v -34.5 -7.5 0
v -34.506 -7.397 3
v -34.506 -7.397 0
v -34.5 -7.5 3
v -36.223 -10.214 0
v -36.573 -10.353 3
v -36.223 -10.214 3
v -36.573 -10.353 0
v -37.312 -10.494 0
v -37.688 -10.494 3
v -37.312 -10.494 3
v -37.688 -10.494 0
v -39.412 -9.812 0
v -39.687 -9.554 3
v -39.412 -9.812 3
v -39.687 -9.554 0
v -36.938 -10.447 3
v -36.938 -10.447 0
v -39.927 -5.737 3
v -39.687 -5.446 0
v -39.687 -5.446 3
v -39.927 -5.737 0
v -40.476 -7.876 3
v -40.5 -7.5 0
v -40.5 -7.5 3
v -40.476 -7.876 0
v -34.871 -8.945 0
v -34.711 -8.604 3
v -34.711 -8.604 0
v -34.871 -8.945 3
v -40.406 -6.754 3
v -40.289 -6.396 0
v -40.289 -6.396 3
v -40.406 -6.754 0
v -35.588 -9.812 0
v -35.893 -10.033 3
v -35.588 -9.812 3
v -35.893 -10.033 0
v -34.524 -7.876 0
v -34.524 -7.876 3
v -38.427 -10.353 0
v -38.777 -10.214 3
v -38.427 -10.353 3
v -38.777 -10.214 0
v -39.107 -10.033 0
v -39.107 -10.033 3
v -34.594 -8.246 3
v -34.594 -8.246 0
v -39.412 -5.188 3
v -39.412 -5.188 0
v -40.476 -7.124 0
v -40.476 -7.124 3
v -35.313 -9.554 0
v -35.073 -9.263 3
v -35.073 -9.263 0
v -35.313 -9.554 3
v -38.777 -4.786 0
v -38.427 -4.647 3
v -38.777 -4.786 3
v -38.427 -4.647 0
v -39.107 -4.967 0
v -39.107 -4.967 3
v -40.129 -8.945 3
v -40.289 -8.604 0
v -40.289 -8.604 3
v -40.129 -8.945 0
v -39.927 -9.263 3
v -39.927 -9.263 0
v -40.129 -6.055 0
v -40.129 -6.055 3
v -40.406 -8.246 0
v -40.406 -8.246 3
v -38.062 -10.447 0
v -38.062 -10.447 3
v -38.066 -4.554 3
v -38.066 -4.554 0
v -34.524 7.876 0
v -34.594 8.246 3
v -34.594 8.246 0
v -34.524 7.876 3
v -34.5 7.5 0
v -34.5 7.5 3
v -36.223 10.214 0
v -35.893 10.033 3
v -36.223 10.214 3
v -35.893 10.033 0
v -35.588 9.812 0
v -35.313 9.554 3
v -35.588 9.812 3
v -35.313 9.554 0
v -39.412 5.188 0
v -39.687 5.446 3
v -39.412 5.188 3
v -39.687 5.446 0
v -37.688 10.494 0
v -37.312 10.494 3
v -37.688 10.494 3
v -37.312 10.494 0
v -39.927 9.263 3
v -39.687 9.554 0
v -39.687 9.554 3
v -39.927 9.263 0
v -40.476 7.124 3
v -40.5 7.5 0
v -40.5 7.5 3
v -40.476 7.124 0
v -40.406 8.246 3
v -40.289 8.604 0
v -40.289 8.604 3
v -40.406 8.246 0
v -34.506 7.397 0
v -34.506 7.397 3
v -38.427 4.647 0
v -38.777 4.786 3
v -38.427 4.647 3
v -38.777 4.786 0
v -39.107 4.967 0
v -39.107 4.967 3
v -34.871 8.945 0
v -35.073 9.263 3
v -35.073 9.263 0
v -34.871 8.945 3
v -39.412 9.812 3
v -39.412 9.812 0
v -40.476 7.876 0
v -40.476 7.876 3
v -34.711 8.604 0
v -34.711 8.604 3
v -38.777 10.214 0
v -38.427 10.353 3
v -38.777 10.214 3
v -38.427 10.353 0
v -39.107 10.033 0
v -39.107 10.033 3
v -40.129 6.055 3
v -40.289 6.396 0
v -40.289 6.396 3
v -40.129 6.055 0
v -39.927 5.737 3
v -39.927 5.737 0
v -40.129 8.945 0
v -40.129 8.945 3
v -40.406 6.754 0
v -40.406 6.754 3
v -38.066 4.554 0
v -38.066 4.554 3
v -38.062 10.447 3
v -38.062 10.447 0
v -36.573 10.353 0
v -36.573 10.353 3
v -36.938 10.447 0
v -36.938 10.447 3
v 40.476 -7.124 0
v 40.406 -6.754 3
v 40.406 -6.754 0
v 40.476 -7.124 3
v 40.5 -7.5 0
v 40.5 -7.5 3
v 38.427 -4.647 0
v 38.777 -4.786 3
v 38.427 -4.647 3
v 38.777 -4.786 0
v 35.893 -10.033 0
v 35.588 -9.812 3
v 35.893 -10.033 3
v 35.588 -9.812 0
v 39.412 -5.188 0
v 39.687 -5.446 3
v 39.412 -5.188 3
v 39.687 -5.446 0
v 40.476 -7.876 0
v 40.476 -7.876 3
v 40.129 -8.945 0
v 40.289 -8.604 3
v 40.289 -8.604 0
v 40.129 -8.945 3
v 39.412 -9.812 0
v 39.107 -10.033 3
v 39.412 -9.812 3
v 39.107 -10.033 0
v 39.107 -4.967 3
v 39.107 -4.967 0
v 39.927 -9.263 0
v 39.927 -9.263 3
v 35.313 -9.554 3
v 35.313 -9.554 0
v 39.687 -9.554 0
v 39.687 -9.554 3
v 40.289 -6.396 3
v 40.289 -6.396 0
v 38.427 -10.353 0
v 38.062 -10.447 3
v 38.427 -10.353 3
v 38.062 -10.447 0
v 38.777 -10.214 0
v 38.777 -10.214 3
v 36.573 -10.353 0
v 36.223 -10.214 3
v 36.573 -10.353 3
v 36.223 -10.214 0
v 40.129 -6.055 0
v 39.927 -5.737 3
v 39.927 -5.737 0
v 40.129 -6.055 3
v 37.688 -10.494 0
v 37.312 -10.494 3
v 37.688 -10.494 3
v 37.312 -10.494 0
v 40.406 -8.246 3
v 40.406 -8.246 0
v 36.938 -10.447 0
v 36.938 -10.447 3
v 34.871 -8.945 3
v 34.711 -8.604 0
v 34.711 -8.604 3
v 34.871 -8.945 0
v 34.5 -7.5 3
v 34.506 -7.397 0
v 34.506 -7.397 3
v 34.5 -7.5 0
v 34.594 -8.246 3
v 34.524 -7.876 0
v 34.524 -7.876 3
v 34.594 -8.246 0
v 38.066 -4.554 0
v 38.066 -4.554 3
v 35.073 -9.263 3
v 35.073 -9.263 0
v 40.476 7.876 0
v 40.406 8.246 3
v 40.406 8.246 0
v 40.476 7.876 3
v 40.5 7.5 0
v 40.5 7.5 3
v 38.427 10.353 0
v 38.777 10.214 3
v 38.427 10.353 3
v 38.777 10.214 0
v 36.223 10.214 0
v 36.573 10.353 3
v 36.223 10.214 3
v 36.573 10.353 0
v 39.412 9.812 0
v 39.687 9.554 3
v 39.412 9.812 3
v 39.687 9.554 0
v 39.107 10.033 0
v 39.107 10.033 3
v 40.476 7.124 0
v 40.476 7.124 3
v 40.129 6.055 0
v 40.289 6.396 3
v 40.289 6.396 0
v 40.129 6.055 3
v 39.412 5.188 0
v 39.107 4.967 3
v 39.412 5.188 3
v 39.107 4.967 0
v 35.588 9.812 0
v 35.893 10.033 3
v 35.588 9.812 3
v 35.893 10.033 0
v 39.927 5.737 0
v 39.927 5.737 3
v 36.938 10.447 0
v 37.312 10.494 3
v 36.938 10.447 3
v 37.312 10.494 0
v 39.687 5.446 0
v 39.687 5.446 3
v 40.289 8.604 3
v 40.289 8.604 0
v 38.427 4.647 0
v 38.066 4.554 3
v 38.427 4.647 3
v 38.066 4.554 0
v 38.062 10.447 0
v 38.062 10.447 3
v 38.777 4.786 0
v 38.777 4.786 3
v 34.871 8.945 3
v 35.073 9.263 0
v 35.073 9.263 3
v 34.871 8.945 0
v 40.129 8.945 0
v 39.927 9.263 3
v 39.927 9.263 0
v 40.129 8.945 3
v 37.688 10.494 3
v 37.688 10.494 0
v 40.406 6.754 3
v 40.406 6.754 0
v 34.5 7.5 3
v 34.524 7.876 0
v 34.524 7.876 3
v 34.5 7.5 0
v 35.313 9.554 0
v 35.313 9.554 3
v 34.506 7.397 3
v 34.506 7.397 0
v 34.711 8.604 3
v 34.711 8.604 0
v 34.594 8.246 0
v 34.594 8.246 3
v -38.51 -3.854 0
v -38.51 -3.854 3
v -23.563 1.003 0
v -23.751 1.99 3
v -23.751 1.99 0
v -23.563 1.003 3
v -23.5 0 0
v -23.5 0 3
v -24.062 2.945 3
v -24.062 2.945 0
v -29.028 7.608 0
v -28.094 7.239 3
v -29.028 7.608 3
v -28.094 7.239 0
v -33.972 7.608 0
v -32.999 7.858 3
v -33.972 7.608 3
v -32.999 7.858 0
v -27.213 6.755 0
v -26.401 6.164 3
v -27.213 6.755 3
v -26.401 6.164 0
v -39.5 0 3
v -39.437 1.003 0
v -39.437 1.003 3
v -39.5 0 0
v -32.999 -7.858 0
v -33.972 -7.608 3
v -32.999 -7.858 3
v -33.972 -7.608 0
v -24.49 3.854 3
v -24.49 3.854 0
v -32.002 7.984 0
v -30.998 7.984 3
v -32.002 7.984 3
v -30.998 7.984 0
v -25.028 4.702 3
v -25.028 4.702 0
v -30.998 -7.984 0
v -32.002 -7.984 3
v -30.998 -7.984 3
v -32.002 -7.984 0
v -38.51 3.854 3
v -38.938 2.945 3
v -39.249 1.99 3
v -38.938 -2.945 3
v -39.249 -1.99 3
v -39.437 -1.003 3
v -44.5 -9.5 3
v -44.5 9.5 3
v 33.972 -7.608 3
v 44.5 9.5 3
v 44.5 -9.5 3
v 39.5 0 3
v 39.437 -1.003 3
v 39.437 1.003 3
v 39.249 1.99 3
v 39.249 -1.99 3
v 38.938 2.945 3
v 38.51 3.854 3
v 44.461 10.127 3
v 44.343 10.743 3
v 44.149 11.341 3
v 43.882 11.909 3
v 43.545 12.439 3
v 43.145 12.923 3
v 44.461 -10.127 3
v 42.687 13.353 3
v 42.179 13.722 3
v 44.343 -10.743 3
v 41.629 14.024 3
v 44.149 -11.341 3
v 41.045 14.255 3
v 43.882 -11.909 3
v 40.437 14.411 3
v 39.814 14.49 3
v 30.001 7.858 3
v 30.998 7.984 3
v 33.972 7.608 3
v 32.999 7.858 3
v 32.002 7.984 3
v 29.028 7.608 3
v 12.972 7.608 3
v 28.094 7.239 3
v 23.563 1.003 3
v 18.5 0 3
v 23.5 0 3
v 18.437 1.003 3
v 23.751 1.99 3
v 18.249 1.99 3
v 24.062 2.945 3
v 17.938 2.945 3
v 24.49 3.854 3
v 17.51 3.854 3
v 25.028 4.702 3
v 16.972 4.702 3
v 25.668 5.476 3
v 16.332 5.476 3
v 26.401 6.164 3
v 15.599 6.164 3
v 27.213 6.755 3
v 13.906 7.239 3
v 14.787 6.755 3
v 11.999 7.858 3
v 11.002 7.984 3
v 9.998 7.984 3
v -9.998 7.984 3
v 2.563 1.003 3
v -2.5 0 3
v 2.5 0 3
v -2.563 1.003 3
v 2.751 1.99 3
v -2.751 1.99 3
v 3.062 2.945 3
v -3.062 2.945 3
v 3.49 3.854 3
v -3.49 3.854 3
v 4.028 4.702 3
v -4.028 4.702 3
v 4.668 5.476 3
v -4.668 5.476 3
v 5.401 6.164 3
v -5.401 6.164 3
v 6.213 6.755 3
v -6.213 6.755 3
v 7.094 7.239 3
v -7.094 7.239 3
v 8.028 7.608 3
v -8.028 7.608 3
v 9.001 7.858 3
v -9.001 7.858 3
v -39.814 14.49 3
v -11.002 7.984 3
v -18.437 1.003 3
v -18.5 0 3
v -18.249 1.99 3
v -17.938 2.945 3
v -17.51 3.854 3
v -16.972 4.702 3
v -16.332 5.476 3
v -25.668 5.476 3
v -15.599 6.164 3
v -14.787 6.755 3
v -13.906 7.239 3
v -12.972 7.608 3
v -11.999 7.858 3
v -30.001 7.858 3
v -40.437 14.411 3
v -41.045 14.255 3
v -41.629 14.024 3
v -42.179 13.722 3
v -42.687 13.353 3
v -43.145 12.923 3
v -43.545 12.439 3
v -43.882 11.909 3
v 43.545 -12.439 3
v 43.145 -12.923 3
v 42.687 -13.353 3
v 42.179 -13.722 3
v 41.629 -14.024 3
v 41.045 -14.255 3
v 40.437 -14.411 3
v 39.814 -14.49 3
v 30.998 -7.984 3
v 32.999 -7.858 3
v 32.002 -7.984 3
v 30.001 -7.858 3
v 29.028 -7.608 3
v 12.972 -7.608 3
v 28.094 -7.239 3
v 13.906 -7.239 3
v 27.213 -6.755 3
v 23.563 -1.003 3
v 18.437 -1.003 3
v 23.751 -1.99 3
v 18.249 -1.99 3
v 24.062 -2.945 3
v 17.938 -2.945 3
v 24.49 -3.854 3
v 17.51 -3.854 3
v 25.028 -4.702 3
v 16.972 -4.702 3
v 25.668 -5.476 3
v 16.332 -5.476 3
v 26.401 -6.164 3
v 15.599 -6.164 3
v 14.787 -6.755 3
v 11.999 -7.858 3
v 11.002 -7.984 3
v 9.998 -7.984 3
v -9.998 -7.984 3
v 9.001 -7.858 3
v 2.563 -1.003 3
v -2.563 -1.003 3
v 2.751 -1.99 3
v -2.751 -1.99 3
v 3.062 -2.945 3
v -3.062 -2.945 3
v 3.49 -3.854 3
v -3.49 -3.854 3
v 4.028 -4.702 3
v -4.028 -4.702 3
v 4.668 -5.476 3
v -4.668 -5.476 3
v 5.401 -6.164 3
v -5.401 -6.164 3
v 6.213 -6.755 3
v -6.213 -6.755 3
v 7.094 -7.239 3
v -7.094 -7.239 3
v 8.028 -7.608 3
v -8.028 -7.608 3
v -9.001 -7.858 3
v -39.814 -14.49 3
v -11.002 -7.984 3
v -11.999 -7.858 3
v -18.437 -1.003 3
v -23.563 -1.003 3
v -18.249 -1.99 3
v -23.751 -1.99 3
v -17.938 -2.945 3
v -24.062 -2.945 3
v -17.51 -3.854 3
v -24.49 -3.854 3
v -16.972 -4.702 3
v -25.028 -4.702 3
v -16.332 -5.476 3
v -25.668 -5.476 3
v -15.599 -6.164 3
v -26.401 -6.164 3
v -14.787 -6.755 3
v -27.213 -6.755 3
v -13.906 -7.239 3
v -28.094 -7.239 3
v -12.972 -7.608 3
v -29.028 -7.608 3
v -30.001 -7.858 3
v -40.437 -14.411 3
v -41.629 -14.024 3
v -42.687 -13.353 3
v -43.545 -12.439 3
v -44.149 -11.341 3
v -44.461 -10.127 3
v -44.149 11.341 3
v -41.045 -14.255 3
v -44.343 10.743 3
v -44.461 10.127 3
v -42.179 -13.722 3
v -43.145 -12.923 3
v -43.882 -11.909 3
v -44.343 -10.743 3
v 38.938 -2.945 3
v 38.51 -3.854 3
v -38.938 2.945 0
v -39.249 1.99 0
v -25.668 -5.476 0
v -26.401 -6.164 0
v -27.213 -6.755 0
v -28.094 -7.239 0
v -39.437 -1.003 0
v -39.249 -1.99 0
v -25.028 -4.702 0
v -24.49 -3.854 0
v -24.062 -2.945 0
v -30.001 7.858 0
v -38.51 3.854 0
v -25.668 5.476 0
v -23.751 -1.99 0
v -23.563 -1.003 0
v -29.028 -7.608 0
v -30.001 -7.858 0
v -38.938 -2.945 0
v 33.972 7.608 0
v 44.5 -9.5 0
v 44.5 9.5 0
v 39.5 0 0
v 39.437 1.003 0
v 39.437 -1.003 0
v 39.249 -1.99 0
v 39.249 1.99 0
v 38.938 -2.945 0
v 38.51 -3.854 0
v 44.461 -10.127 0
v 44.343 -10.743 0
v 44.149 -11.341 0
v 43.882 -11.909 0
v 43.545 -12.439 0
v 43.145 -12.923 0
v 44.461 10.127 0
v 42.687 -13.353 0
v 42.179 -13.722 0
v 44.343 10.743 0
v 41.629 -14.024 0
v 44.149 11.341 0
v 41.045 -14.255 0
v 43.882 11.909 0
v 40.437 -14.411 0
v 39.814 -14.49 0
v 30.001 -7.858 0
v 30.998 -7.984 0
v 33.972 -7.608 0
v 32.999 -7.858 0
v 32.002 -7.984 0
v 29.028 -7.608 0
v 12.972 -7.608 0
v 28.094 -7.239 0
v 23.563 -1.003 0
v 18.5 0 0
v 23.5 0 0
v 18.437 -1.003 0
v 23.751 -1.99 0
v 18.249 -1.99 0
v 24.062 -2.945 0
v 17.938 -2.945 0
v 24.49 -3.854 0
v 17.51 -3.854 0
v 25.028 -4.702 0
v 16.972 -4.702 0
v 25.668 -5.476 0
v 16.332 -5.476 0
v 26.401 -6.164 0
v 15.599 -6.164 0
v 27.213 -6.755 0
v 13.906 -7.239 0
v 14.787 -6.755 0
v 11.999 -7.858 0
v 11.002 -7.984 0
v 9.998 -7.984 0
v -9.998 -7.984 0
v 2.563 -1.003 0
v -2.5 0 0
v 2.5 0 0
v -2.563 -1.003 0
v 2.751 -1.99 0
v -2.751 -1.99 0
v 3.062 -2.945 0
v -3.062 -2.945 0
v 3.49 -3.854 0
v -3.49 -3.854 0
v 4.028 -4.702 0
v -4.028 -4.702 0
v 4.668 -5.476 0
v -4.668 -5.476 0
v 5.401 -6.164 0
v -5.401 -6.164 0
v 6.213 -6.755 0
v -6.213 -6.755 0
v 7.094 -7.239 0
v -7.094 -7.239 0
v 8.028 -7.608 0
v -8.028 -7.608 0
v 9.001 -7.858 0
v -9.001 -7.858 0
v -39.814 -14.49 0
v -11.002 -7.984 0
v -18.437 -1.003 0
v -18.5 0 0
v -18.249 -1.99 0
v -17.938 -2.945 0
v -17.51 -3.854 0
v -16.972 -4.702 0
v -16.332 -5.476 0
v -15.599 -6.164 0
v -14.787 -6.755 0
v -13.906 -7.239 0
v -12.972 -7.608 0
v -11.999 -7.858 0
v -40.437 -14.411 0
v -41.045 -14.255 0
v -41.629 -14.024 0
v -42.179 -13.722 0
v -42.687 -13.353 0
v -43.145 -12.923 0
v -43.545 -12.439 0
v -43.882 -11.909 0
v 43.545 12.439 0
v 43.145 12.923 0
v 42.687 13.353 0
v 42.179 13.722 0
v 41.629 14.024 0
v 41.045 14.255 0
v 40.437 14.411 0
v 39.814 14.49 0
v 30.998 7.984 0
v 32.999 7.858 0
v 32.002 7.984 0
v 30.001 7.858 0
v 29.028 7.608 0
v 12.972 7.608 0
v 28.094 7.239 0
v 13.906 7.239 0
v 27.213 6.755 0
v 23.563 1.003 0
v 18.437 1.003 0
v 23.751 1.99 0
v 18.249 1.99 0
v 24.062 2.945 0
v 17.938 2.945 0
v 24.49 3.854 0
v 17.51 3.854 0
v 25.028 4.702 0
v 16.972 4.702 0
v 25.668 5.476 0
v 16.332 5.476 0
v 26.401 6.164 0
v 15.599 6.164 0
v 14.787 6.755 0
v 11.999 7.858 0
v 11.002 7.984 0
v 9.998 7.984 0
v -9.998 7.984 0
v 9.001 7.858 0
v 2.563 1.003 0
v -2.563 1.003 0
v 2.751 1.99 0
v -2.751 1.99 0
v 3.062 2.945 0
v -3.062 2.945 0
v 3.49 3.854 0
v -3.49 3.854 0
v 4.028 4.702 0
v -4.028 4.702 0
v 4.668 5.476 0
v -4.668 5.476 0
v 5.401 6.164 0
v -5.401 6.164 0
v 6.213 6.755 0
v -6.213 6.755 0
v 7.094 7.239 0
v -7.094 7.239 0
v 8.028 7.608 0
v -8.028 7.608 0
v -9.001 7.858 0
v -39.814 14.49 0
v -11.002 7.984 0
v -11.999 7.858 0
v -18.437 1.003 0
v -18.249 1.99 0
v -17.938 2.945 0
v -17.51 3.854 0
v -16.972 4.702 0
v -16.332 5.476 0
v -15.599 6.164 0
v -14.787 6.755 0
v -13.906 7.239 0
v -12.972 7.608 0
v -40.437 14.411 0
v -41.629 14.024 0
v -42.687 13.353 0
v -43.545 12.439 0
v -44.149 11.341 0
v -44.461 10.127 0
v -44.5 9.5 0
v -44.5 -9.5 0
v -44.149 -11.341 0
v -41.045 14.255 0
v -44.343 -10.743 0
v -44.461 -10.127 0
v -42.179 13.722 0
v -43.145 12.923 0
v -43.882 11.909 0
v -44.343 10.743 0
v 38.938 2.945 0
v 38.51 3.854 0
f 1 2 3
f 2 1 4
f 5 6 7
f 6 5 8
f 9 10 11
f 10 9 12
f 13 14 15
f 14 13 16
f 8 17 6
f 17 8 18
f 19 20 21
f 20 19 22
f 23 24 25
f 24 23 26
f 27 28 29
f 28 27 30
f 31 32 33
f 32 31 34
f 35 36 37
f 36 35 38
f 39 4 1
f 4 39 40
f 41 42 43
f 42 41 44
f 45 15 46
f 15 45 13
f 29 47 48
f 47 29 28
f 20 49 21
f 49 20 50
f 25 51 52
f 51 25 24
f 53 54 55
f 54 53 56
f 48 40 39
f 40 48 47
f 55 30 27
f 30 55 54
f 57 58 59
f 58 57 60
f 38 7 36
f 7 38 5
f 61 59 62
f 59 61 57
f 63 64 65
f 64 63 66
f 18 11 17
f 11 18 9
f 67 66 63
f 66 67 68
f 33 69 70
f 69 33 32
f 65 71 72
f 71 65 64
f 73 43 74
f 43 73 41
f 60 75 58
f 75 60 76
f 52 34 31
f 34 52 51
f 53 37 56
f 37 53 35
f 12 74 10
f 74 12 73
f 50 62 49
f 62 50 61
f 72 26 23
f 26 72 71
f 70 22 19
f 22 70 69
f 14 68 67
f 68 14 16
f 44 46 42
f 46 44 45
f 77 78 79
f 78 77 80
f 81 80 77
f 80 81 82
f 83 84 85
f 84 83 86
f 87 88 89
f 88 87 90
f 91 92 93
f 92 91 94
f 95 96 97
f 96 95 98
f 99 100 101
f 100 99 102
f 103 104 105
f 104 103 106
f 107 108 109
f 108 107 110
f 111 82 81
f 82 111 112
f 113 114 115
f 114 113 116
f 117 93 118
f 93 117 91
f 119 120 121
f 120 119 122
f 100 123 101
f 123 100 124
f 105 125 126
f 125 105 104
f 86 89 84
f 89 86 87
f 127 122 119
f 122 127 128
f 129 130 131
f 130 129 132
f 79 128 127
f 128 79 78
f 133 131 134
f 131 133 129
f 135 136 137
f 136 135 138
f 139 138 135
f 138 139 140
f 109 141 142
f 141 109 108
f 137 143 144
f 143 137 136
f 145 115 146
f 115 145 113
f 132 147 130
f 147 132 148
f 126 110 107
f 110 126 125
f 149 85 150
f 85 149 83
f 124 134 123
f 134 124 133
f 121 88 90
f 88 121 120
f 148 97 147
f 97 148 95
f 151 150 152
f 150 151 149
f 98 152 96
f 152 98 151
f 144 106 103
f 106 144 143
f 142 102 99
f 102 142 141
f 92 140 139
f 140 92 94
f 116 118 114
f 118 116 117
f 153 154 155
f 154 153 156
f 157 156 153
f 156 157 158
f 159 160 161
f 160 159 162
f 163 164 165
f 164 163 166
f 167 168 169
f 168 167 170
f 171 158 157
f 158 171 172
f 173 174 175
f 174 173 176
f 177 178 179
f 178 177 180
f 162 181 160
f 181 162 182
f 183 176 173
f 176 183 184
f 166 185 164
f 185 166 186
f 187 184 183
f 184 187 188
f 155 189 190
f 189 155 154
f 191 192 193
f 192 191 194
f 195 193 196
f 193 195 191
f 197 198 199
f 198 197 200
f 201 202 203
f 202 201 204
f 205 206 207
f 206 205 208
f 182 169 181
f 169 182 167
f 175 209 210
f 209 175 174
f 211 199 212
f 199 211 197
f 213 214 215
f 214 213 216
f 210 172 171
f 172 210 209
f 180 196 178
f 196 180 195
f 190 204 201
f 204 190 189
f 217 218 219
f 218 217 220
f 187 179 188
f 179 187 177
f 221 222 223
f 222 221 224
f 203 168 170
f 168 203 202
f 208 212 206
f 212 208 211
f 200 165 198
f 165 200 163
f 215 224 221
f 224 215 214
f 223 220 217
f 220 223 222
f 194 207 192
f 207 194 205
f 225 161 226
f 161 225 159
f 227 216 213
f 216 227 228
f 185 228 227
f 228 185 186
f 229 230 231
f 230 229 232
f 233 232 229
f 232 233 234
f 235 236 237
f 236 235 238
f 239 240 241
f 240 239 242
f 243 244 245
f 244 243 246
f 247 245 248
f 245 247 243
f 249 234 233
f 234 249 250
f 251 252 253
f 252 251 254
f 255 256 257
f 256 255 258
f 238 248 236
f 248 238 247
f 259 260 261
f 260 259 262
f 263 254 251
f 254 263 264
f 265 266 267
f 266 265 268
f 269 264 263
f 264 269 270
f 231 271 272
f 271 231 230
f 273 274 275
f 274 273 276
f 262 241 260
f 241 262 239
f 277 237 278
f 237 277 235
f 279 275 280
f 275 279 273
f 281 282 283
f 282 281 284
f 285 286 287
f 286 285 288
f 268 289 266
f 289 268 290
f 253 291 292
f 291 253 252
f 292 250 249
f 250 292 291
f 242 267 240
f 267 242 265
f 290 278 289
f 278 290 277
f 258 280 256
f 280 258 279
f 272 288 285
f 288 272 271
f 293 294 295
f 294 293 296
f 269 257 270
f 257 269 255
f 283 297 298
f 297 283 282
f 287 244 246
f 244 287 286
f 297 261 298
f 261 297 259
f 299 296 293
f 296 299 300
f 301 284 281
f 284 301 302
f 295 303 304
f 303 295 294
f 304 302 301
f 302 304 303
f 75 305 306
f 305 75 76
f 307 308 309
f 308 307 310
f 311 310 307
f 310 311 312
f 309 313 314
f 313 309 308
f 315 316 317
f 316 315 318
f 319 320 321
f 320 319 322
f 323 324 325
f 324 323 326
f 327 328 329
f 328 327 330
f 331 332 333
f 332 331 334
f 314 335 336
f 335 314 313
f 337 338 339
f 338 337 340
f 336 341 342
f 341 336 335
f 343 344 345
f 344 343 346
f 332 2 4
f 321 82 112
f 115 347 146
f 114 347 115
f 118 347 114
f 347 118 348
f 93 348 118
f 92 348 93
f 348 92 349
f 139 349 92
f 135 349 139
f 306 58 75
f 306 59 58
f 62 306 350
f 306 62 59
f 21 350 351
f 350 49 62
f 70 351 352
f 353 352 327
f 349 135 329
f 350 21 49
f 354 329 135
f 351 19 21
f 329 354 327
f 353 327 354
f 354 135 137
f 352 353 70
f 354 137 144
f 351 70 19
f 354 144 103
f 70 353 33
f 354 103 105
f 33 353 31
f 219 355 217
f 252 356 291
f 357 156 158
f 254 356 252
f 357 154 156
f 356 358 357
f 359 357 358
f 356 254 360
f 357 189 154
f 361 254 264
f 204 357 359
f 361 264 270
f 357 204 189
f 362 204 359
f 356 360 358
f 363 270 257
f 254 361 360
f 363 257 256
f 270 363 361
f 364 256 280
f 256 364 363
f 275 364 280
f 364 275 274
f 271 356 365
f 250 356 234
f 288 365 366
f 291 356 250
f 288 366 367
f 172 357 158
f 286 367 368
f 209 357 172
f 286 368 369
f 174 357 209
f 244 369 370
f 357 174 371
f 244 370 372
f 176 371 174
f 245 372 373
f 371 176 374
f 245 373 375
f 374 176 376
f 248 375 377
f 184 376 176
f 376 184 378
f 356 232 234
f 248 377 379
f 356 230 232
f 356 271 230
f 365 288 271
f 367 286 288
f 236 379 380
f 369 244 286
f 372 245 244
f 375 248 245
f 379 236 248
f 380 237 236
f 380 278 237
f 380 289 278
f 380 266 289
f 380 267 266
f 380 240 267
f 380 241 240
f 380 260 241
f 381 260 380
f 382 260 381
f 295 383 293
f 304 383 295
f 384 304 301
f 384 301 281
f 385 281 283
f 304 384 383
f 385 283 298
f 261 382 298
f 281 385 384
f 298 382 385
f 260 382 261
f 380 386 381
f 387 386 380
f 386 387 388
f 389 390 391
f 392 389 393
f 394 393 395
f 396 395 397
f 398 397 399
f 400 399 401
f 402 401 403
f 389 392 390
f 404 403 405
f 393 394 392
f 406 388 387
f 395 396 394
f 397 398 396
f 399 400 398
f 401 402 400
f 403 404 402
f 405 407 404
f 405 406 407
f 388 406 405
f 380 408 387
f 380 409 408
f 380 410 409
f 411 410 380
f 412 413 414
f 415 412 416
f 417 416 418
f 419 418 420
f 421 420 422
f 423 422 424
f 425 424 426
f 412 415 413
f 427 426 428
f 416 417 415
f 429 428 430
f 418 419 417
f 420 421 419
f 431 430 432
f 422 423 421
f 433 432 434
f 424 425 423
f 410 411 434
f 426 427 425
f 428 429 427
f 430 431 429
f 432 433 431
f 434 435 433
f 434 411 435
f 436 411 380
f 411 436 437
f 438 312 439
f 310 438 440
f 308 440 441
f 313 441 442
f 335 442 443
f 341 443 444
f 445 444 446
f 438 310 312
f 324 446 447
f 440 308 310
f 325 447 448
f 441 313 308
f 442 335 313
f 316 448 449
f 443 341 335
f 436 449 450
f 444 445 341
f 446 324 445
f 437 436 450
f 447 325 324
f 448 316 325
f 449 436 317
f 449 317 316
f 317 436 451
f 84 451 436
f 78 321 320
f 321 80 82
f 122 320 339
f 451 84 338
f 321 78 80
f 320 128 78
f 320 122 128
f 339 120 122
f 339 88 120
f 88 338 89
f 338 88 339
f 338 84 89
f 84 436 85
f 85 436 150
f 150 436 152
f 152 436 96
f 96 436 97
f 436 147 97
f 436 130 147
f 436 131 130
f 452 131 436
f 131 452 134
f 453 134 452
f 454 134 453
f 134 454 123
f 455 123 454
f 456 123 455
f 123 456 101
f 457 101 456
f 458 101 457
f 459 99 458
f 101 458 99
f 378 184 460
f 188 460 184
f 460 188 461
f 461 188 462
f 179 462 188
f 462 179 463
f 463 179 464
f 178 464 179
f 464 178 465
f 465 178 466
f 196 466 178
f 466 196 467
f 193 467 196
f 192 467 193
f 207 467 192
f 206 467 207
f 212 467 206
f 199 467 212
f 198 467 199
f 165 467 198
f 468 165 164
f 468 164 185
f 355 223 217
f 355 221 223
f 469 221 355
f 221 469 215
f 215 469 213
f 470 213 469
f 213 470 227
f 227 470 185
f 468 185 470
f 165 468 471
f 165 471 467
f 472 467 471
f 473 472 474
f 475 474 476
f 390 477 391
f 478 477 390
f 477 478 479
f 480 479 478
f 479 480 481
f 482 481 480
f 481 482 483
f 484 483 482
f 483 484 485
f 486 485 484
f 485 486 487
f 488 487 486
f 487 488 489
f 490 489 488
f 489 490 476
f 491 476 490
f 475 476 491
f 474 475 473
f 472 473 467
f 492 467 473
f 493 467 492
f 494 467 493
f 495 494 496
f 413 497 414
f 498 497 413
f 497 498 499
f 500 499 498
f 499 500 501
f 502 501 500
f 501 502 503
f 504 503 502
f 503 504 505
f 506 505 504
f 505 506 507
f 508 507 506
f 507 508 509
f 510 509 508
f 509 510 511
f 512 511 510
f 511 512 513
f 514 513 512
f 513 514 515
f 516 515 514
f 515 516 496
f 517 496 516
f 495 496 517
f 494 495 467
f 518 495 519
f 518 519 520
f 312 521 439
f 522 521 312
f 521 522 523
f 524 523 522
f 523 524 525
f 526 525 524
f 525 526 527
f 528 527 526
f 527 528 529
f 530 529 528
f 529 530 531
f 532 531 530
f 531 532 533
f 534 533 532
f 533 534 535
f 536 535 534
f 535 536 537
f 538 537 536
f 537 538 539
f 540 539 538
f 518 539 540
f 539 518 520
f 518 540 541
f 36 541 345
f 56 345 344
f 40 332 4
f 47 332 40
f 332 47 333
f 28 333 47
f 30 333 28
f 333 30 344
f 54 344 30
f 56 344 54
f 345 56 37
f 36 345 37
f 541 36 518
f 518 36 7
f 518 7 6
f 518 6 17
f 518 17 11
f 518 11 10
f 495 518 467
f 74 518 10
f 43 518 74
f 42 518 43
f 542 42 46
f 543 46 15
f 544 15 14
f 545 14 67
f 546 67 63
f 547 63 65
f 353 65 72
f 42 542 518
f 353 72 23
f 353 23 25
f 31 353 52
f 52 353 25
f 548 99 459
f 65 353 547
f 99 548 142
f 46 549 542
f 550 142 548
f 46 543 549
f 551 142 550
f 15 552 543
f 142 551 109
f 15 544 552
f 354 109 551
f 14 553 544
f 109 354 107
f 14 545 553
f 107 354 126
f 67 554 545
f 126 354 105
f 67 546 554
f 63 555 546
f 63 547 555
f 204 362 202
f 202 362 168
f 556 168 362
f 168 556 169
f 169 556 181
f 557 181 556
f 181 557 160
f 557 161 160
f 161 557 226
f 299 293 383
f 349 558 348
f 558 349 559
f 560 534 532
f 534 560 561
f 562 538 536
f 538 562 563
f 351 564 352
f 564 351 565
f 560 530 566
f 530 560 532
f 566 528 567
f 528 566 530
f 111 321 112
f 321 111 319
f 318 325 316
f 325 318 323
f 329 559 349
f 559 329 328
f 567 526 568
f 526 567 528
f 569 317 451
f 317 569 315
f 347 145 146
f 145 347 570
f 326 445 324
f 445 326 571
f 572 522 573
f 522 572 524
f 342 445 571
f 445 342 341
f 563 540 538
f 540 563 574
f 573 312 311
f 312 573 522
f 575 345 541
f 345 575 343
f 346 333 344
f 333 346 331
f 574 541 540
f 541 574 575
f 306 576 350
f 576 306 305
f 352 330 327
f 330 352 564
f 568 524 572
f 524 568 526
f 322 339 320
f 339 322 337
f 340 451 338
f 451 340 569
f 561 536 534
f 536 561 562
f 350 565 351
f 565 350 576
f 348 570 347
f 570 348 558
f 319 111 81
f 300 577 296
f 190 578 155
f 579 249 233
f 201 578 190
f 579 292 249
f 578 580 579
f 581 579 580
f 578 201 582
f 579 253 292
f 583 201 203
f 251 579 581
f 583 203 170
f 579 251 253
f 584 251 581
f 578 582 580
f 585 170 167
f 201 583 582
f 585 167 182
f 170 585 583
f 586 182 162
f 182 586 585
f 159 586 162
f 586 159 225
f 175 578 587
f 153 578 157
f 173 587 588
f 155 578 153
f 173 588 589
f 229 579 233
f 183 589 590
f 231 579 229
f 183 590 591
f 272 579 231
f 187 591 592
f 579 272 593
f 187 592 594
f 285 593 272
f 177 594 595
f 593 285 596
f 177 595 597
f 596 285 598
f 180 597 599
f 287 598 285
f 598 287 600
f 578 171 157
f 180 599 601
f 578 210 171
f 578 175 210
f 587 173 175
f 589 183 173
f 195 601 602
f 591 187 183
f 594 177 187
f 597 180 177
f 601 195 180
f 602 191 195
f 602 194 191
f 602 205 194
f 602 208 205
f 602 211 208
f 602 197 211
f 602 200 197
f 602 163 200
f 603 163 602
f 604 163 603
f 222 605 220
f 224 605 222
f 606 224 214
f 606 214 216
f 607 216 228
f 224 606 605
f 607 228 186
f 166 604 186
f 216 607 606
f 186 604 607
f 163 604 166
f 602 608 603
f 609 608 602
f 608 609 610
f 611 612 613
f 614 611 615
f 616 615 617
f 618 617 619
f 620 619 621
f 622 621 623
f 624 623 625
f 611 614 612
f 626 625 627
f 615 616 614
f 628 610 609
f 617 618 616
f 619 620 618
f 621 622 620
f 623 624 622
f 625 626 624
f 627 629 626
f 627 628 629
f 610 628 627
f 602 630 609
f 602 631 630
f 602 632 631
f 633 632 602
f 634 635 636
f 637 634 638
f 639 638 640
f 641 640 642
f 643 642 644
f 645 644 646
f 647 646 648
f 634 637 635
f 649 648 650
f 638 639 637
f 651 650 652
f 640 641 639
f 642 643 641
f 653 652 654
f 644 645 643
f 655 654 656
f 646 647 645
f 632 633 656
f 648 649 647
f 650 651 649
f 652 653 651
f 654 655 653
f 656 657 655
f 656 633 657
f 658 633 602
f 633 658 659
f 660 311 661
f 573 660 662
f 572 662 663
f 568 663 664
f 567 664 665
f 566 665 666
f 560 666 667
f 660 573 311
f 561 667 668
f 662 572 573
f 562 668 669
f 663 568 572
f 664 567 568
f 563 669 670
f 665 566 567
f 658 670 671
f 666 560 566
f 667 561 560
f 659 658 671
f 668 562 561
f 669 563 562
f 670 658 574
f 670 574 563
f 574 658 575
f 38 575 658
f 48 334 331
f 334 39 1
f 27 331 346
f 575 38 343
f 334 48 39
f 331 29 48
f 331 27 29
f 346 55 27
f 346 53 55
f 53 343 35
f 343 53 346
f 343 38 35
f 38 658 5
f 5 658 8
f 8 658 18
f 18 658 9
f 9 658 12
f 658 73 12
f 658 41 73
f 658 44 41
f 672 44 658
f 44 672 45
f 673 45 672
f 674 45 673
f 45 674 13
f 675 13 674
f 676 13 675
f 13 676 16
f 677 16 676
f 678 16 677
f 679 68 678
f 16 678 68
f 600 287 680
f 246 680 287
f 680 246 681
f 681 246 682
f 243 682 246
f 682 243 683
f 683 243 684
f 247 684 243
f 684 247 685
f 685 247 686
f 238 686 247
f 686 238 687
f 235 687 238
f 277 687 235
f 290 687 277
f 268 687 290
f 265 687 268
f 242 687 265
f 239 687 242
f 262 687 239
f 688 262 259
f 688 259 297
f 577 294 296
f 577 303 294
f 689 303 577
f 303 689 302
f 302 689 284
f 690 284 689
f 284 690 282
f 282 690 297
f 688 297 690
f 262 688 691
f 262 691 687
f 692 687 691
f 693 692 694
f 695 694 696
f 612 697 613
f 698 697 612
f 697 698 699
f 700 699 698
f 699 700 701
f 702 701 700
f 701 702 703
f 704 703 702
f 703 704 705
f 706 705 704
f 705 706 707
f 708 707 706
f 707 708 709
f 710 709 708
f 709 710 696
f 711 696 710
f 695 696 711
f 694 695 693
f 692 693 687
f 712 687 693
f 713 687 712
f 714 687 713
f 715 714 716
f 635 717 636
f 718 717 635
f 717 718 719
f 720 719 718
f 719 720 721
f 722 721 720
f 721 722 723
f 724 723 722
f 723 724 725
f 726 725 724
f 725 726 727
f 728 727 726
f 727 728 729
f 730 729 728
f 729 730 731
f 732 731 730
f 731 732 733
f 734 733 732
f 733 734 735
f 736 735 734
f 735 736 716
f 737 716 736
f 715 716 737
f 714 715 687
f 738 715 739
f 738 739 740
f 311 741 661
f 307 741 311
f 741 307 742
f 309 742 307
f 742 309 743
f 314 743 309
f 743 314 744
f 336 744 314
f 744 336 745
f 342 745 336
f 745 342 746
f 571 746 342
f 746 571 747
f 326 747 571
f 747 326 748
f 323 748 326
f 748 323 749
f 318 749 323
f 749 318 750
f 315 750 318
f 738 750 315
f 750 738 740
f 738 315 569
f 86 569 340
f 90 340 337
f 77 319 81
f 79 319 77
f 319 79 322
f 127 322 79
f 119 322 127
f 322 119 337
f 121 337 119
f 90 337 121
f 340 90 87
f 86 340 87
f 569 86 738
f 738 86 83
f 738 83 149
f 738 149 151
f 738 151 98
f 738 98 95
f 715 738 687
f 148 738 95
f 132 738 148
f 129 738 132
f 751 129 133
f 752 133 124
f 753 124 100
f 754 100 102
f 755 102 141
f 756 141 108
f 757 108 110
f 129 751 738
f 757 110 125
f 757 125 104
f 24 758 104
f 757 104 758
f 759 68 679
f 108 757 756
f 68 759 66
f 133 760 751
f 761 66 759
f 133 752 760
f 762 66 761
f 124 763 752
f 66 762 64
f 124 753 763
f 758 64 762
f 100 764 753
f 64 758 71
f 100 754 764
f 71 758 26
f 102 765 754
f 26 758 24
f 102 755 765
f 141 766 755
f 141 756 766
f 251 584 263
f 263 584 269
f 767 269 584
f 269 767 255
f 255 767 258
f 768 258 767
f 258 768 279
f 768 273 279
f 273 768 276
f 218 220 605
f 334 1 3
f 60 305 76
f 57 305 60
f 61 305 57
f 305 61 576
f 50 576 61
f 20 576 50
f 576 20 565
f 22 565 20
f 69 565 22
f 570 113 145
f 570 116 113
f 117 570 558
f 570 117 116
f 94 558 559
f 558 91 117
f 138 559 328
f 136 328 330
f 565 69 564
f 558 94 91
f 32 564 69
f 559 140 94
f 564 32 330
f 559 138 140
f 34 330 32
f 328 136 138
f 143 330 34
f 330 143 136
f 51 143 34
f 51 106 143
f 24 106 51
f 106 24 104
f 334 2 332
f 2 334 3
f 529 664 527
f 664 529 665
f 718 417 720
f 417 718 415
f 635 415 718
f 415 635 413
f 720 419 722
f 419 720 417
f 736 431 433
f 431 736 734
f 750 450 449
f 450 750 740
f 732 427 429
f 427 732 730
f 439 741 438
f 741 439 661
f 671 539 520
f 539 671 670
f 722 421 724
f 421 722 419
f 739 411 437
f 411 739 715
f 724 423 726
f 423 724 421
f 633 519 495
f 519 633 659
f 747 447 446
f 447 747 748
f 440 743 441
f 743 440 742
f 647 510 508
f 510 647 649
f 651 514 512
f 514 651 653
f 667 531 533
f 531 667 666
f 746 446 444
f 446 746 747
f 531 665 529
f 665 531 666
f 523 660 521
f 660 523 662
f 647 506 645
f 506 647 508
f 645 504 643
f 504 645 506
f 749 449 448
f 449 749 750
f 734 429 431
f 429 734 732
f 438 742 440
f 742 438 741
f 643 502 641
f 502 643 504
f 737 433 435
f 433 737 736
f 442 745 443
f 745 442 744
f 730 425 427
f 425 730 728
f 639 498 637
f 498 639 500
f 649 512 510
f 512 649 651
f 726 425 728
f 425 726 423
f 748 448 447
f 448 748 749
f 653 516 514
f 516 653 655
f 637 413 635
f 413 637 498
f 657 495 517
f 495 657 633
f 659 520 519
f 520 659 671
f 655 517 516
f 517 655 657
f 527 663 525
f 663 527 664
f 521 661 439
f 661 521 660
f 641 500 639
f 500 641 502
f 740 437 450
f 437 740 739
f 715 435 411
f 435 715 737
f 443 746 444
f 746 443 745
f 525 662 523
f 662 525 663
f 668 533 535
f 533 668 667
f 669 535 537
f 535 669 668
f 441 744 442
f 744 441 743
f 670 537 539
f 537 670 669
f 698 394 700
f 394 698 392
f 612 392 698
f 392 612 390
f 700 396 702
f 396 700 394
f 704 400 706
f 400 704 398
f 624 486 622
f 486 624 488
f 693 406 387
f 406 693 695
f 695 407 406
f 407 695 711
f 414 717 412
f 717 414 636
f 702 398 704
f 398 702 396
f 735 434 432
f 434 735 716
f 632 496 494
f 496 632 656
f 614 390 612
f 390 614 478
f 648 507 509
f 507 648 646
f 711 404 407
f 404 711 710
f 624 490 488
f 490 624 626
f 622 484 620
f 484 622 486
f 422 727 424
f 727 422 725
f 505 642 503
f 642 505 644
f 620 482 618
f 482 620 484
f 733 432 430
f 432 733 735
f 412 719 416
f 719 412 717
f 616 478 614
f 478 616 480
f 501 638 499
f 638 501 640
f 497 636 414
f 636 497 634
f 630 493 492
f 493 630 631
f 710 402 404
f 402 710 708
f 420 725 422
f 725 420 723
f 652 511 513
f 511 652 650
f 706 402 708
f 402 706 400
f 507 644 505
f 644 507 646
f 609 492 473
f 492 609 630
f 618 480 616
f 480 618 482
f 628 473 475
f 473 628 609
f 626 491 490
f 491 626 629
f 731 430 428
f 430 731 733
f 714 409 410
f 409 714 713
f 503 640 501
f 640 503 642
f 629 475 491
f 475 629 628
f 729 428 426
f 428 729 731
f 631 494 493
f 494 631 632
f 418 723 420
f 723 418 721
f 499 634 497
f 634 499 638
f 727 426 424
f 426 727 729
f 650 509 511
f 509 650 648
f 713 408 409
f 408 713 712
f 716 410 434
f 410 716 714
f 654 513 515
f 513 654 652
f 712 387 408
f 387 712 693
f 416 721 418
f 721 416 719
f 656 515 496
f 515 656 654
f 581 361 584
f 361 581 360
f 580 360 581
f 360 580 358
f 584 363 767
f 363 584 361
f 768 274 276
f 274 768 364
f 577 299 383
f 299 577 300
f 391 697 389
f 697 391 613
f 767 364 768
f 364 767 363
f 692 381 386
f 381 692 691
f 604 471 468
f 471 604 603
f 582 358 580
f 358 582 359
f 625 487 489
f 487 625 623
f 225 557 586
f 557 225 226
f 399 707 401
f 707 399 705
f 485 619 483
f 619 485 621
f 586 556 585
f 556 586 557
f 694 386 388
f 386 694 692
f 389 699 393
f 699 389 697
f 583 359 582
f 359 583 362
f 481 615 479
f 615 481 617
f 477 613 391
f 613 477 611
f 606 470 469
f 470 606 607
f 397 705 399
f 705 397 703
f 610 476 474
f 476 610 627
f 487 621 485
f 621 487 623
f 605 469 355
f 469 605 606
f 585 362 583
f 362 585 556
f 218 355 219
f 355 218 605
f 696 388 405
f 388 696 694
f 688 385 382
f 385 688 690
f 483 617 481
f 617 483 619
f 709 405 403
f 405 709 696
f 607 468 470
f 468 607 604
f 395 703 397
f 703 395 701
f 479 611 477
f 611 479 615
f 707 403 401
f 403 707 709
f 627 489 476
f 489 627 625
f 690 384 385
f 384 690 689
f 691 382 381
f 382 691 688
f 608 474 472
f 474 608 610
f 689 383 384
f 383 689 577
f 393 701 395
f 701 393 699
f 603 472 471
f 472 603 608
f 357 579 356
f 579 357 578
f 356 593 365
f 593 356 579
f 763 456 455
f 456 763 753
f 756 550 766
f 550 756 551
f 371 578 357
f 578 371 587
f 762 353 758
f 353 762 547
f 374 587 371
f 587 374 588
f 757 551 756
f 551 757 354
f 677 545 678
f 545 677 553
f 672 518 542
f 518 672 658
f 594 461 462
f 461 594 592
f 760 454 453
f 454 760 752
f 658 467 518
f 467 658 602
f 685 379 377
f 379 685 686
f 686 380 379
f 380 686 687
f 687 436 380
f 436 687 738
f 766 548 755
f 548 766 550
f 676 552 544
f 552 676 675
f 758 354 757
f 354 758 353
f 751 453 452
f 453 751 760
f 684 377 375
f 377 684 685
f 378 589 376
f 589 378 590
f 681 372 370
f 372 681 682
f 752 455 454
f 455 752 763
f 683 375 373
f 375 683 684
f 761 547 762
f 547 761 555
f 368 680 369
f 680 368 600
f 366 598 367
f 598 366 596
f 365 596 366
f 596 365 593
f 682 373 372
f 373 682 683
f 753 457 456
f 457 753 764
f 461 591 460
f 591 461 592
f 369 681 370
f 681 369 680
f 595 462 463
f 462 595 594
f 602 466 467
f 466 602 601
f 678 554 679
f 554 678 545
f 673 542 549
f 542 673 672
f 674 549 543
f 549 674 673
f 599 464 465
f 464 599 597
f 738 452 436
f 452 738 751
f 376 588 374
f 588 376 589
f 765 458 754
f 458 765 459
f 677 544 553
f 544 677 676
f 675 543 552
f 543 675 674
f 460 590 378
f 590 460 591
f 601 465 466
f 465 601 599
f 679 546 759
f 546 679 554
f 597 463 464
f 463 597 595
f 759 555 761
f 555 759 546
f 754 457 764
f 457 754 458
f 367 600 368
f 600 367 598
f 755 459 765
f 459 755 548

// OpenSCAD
$fn = 50;


difference() {
	union() {
		hull() {
			translate(v = [-39.5000000000, 9.5000000000, 0]) {
				cylinder(h = 3, r = 5);
			}
			translate(v = [39.5000000000, 9.5000000000, 0]) {
				cylinder(h = 3, r = 5);
			}
			translate(v = [-39.5000000000, -9.5000000000, 0]) {
				cylinder(h = 3, r = 5);
			}
			translate(v = [39.5000000000, -9.5000000000, 0]) {
				cylinder(h = 3, r = 5);
			}
		}
	}
	union() {
		#translate(v = [-37.5000000000, -7.5000000000, -100.0000000000]) {
			cylinder(h = 200, r = 3.0000000000);
		}
		#translate(v = [-37.5000000000, 7.5000000000, -100.0000000000]) {
			cylinder(h = 200, r = 3.0000000000);
		}
		#translate(v = [37.5000000000, -7.5000000000, -100.0000000000]) {
			cylinder(h = 200, r = 3.0000000000);
		}
		#translate(v = [37.5000000000, 7.5000000000, -100.0000000000]) {
			cylinder(h = 200, r = 3.0000000000);
		}
		#translate(v = [-31.5000000000, 0, 0]) {
			cylinder(h = 3, r = 8.0000000000);
		}
		#translate(v = [-10.5000000000, 0, 0]) {
			cylinder(h = 3, r = 8.0000000000);
		}
		#translate(v = [10.5000000000, 0, 0]) {
			cylinder(h = 3, r = 8.0000000000);
		}
		#translate(v = [31.5000000000, 0, 0]) {
			cylinder(h = 3, r = 8.0000000000);
		}
	}
}
